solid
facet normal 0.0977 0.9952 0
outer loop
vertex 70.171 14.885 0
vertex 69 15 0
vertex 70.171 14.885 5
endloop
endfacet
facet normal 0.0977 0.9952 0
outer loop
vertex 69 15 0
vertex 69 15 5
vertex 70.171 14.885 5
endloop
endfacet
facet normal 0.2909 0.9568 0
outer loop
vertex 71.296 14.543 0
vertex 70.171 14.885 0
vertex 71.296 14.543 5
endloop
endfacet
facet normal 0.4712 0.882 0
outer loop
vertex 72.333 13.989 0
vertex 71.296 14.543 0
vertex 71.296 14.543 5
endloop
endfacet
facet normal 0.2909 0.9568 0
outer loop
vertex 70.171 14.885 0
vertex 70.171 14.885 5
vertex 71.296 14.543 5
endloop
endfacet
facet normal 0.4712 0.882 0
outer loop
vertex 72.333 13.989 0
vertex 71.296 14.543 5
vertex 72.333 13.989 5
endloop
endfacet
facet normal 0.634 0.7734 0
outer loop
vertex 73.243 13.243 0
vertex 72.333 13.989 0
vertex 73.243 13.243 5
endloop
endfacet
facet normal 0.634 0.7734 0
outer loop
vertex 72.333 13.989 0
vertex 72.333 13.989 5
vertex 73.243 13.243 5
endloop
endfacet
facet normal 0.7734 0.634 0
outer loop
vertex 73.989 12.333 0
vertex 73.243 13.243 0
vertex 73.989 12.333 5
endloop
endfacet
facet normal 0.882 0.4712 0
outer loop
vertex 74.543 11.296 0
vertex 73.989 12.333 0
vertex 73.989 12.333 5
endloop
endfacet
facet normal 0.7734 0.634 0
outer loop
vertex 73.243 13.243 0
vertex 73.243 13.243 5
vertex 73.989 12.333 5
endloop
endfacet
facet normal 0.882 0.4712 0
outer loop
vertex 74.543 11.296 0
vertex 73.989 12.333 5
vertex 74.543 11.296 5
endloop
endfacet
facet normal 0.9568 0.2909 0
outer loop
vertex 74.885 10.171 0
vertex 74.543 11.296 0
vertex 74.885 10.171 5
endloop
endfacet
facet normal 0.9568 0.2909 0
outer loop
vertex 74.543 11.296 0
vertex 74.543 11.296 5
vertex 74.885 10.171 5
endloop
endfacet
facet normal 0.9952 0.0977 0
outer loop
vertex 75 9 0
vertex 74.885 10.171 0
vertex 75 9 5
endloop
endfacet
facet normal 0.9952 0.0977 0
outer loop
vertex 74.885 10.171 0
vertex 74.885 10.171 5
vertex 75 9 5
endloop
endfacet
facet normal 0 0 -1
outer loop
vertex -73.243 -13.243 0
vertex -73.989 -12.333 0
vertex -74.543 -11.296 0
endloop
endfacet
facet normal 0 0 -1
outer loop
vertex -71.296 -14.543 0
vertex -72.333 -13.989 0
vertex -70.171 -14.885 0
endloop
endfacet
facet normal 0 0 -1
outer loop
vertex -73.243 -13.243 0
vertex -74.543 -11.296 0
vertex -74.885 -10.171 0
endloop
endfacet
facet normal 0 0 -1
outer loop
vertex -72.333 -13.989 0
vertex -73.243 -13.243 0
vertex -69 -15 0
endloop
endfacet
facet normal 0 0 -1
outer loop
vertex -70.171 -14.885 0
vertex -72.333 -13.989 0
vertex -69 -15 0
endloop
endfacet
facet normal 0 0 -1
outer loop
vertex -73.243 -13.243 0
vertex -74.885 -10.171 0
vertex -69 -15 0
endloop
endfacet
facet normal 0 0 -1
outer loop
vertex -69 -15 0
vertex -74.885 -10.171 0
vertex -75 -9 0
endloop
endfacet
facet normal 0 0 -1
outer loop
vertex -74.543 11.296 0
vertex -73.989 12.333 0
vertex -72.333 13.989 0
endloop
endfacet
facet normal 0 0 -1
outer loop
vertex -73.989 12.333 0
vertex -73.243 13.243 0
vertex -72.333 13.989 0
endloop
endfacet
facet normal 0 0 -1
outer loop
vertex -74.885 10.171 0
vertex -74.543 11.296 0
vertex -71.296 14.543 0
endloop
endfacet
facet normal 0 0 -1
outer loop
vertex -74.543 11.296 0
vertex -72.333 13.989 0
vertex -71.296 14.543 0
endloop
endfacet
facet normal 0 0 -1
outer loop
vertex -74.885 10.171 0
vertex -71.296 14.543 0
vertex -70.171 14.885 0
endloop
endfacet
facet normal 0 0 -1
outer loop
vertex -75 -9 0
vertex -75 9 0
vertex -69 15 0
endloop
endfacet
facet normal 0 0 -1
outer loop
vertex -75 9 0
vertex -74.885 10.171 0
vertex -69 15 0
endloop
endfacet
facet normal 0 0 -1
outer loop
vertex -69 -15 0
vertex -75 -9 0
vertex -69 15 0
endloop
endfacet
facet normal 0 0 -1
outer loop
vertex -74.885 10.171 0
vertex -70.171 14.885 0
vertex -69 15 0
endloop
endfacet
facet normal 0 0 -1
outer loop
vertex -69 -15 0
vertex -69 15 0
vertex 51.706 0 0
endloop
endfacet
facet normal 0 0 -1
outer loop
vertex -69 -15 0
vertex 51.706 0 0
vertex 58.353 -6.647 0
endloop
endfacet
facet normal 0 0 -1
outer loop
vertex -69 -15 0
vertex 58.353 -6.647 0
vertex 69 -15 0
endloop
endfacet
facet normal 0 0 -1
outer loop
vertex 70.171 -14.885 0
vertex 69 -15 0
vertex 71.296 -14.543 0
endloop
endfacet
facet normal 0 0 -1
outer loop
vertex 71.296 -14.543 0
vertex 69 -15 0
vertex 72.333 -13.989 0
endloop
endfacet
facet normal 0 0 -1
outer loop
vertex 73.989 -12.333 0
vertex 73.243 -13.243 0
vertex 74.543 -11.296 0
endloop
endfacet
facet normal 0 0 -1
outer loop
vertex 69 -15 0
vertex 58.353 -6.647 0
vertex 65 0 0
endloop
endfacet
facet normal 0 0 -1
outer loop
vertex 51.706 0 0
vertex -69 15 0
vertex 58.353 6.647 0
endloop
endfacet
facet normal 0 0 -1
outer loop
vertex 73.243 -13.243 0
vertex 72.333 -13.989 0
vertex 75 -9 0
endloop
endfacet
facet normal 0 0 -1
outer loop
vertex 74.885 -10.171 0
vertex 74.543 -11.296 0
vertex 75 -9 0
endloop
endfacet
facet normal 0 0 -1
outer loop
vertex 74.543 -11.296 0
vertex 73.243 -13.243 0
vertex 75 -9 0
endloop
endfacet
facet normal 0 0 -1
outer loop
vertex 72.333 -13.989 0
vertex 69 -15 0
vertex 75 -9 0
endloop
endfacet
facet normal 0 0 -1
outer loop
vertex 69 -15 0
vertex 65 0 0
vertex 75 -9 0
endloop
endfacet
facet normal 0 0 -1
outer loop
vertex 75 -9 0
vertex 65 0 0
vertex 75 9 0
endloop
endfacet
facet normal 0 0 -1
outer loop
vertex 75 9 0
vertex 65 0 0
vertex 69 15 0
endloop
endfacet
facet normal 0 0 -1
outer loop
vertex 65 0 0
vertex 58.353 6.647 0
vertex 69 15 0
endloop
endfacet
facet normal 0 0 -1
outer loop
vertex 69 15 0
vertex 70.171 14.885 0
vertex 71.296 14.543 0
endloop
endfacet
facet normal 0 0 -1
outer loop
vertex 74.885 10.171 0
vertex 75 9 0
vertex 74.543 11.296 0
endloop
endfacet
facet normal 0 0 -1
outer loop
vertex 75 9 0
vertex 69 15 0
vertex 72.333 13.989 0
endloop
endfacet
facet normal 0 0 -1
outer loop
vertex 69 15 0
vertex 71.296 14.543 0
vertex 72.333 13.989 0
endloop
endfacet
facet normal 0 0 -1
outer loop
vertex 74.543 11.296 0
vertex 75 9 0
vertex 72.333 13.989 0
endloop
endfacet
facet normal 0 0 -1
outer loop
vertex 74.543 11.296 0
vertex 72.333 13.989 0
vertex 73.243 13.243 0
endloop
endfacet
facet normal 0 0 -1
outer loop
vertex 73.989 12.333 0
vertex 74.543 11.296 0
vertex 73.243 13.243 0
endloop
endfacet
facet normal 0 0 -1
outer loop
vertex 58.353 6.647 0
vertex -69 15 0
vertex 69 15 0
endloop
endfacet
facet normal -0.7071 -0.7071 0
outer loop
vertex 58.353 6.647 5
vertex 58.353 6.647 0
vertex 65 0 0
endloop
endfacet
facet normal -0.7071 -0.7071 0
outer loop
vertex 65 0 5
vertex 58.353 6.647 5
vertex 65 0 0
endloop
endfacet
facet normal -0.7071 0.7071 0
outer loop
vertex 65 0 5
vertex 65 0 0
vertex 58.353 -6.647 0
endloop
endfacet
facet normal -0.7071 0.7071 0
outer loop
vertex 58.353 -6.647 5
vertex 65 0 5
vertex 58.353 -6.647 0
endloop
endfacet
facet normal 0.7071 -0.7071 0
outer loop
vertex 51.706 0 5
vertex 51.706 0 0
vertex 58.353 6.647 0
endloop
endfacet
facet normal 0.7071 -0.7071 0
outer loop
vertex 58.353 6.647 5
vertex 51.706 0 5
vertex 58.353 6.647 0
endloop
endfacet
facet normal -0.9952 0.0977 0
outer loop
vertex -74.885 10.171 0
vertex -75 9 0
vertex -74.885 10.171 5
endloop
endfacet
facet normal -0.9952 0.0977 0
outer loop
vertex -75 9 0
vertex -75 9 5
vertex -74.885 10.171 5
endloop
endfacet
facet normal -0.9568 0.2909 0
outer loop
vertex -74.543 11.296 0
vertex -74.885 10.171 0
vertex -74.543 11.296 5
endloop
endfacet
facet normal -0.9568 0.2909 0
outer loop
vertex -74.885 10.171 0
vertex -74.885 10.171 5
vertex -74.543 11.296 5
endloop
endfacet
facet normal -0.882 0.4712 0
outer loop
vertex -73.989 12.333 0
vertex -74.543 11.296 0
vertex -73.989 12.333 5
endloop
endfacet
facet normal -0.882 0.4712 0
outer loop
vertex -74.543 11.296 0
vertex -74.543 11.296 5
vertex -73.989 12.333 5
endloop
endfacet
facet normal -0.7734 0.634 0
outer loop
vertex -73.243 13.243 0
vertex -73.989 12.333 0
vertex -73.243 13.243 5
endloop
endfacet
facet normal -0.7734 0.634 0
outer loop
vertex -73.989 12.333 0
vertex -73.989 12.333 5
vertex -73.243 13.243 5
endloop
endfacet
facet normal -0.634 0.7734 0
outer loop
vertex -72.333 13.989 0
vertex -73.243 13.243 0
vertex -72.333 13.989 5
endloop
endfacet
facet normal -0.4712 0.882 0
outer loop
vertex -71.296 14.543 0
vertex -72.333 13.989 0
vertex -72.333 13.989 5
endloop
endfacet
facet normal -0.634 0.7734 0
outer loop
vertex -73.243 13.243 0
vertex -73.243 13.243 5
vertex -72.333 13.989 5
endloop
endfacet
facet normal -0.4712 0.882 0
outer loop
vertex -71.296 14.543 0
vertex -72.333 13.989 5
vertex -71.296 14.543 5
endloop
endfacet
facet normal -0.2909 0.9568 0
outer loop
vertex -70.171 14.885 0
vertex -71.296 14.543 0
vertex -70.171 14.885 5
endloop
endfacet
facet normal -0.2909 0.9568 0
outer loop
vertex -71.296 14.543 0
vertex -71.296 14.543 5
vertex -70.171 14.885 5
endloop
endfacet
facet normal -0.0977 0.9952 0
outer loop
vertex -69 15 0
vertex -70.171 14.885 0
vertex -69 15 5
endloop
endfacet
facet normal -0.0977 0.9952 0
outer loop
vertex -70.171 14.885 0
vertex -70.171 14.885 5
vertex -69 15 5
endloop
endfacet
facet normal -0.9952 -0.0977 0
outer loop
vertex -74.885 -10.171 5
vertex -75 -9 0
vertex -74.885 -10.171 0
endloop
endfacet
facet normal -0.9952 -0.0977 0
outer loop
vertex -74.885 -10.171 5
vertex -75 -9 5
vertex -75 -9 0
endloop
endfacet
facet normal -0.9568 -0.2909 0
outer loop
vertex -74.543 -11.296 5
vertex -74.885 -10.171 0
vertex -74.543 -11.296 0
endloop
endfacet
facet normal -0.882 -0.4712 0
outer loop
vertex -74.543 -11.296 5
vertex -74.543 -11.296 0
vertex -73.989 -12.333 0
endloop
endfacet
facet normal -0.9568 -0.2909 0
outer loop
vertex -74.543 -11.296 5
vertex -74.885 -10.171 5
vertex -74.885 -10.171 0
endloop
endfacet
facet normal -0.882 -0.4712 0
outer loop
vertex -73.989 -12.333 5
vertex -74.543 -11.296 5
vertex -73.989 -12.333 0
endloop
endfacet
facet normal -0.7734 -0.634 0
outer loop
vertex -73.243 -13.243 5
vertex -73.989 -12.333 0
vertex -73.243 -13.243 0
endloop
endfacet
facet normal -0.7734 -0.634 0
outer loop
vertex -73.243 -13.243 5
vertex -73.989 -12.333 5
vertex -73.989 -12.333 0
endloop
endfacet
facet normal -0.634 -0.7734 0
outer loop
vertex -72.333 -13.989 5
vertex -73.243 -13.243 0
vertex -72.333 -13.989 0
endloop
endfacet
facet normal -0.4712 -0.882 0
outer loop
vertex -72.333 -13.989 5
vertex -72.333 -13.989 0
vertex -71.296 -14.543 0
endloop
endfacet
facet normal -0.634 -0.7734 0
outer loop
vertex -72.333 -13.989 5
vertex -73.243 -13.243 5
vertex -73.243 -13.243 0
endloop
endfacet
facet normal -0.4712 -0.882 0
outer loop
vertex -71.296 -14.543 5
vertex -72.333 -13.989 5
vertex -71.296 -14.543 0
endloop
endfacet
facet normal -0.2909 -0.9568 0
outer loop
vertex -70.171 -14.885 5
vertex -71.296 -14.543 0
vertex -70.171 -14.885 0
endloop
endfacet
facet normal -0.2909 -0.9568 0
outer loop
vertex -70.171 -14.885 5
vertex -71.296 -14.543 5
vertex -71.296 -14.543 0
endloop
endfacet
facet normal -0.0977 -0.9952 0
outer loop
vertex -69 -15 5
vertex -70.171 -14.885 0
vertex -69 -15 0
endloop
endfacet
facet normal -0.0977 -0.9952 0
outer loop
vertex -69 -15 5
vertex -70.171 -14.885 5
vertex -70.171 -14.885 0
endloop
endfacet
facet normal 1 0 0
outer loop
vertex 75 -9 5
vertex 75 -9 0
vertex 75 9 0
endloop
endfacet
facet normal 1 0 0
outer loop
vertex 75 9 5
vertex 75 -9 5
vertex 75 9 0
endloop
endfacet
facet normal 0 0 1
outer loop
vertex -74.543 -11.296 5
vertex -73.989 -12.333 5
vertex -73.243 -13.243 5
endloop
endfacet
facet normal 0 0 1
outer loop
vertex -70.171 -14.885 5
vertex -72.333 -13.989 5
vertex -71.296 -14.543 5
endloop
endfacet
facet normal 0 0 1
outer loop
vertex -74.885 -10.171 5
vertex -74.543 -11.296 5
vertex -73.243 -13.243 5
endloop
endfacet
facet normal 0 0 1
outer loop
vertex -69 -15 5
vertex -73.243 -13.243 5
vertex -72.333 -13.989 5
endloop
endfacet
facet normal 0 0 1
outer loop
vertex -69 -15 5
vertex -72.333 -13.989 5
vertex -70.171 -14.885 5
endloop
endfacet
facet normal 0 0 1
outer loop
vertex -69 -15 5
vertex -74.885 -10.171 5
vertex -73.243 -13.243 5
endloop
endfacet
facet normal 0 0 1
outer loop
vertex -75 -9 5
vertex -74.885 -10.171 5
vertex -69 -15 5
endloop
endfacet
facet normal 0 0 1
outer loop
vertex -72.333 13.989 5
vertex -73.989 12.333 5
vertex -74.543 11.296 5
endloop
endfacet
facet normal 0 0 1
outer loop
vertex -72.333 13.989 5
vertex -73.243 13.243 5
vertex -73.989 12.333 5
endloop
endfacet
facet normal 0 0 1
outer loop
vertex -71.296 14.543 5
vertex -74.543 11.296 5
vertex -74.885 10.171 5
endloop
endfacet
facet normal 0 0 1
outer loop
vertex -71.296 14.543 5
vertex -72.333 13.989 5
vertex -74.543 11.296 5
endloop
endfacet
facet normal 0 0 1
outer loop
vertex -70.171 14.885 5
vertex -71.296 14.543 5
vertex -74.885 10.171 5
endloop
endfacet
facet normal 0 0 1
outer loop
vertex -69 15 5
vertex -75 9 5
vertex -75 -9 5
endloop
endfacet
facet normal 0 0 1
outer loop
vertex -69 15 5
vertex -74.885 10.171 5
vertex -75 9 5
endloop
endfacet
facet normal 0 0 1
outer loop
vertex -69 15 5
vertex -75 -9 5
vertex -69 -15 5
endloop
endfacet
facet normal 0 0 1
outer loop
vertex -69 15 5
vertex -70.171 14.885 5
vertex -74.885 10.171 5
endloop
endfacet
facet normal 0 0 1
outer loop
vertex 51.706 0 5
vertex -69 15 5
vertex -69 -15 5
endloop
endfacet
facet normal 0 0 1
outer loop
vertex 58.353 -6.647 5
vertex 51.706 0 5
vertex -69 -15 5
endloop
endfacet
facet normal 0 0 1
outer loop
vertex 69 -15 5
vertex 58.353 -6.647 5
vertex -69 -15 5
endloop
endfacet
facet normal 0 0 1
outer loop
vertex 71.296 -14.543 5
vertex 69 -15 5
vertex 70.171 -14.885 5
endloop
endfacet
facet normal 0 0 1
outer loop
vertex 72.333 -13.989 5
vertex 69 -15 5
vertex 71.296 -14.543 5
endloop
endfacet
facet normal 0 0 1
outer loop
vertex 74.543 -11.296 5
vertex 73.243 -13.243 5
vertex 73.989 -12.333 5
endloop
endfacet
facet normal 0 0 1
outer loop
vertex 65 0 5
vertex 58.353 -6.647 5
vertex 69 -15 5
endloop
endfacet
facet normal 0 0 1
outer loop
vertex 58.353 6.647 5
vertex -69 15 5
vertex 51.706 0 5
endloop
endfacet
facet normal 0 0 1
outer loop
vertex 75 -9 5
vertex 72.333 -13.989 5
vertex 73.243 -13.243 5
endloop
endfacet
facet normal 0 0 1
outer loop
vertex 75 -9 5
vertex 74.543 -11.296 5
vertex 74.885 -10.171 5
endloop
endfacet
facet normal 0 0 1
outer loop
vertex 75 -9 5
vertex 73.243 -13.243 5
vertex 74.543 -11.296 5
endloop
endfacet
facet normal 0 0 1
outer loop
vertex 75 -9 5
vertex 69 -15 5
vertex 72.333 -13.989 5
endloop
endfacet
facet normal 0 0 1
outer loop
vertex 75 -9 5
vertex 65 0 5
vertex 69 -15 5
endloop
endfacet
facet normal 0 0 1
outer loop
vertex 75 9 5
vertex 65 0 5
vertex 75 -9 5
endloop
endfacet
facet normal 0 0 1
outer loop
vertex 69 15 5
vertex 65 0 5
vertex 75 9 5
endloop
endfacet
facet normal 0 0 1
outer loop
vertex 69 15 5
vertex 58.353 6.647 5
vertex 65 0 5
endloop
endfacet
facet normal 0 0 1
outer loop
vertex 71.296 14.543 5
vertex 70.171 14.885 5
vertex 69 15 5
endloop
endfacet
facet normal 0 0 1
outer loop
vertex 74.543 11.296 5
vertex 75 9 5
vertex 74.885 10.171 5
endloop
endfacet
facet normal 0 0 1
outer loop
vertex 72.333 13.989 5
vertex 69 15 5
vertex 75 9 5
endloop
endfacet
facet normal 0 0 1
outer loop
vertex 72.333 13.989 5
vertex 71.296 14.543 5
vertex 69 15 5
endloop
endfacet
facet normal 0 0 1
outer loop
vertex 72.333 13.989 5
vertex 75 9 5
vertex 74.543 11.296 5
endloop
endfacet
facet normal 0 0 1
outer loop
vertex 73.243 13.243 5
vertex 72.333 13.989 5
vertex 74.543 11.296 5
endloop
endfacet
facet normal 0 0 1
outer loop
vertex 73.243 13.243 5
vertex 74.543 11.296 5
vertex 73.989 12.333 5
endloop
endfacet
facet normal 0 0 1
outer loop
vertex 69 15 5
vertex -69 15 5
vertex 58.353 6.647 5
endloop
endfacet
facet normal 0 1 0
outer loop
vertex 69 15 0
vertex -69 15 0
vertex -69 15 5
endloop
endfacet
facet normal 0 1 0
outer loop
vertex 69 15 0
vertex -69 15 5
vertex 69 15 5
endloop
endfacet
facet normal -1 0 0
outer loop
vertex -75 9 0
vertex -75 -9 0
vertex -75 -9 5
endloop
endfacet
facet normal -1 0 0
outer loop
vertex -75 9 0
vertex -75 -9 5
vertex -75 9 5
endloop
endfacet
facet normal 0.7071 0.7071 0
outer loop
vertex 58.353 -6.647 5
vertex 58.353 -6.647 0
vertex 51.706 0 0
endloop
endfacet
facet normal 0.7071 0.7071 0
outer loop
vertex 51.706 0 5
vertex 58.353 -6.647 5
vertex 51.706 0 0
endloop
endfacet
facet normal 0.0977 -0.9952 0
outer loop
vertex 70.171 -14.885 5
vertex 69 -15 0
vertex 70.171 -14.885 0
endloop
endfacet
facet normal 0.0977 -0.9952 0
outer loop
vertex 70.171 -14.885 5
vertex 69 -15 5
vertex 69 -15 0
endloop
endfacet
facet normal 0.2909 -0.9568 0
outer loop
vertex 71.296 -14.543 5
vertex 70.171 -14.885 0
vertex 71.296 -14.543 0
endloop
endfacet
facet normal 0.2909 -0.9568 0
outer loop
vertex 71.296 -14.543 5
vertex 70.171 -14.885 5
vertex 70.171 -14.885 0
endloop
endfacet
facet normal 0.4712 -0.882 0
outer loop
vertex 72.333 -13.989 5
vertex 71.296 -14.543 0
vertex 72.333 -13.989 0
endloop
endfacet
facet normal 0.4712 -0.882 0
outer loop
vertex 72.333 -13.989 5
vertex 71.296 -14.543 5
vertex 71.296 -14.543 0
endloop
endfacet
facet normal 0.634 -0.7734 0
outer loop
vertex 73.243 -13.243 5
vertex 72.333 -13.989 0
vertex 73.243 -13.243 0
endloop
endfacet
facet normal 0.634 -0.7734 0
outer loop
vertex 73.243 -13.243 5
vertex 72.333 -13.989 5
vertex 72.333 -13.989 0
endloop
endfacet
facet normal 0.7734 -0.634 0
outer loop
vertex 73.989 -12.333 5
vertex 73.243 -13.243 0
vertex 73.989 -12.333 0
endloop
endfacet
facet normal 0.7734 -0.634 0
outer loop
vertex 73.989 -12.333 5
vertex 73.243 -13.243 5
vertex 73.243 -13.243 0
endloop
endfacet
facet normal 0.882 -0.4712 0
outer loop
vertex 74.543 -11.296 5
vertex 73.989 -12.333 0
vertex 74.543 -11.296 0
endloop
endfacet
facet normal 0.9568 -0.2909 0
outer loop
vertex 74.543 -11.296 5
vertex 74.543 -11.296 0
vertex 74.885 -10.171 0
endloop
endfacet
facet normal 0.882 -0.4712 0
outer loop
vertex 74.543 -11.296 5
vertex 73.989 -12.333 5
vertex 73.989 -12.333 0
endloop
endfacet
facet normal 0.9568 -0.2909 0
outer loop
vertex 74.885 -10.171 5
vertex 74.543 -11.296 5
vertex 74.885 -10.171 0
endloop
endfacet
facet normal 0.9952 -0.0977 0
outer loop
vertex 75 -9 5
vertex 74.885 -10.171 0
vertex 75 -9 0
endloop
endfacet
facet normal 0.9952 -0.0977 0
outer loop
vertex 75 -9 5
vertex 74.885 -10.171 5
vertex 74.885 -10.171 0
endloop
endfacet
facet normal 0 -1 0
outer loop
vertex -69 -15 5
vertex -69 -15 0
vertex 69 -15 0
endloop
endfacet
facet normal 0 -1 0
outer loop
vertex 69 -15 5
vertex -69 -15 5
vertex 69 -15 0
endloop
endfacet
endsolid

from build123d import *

# Parameters (mm, degrees)
ESQUISSE1_W        = 150
ESQUISSE1_H        = 30
BOSS_EXTRU_1_DEPTH = 5
CONG_1_R           = 6


with BuildPart() as part:
    # Esquisse1 → Boss.-Extru.1 (new body)
    with BuildSketch(Plane.XY):
        Rectangle(ESQUISSE1_W, ESQUISSE1_H)
        Polygon((58.353196257, -6.646803743), (51.706392514, 0), (58.353196257, 6.646803743), (65, 0), align=None, mode=Mode.SUBTRACT)
    extrude(amount=BOSS_EXTRU_1_DEPTH)

    # Congé1
    cong_1_edges = [part.edges().sort_by_distance(p)[0] for p in [
        (75, -15, 2.5),
        (-75, -15, 2.5),
        (-75, 15, 2.5),
        (75, 15, 2.5),
    ]]
    fillet(cong_1_edges, radius=CONG_1_R)


solid = part.part
